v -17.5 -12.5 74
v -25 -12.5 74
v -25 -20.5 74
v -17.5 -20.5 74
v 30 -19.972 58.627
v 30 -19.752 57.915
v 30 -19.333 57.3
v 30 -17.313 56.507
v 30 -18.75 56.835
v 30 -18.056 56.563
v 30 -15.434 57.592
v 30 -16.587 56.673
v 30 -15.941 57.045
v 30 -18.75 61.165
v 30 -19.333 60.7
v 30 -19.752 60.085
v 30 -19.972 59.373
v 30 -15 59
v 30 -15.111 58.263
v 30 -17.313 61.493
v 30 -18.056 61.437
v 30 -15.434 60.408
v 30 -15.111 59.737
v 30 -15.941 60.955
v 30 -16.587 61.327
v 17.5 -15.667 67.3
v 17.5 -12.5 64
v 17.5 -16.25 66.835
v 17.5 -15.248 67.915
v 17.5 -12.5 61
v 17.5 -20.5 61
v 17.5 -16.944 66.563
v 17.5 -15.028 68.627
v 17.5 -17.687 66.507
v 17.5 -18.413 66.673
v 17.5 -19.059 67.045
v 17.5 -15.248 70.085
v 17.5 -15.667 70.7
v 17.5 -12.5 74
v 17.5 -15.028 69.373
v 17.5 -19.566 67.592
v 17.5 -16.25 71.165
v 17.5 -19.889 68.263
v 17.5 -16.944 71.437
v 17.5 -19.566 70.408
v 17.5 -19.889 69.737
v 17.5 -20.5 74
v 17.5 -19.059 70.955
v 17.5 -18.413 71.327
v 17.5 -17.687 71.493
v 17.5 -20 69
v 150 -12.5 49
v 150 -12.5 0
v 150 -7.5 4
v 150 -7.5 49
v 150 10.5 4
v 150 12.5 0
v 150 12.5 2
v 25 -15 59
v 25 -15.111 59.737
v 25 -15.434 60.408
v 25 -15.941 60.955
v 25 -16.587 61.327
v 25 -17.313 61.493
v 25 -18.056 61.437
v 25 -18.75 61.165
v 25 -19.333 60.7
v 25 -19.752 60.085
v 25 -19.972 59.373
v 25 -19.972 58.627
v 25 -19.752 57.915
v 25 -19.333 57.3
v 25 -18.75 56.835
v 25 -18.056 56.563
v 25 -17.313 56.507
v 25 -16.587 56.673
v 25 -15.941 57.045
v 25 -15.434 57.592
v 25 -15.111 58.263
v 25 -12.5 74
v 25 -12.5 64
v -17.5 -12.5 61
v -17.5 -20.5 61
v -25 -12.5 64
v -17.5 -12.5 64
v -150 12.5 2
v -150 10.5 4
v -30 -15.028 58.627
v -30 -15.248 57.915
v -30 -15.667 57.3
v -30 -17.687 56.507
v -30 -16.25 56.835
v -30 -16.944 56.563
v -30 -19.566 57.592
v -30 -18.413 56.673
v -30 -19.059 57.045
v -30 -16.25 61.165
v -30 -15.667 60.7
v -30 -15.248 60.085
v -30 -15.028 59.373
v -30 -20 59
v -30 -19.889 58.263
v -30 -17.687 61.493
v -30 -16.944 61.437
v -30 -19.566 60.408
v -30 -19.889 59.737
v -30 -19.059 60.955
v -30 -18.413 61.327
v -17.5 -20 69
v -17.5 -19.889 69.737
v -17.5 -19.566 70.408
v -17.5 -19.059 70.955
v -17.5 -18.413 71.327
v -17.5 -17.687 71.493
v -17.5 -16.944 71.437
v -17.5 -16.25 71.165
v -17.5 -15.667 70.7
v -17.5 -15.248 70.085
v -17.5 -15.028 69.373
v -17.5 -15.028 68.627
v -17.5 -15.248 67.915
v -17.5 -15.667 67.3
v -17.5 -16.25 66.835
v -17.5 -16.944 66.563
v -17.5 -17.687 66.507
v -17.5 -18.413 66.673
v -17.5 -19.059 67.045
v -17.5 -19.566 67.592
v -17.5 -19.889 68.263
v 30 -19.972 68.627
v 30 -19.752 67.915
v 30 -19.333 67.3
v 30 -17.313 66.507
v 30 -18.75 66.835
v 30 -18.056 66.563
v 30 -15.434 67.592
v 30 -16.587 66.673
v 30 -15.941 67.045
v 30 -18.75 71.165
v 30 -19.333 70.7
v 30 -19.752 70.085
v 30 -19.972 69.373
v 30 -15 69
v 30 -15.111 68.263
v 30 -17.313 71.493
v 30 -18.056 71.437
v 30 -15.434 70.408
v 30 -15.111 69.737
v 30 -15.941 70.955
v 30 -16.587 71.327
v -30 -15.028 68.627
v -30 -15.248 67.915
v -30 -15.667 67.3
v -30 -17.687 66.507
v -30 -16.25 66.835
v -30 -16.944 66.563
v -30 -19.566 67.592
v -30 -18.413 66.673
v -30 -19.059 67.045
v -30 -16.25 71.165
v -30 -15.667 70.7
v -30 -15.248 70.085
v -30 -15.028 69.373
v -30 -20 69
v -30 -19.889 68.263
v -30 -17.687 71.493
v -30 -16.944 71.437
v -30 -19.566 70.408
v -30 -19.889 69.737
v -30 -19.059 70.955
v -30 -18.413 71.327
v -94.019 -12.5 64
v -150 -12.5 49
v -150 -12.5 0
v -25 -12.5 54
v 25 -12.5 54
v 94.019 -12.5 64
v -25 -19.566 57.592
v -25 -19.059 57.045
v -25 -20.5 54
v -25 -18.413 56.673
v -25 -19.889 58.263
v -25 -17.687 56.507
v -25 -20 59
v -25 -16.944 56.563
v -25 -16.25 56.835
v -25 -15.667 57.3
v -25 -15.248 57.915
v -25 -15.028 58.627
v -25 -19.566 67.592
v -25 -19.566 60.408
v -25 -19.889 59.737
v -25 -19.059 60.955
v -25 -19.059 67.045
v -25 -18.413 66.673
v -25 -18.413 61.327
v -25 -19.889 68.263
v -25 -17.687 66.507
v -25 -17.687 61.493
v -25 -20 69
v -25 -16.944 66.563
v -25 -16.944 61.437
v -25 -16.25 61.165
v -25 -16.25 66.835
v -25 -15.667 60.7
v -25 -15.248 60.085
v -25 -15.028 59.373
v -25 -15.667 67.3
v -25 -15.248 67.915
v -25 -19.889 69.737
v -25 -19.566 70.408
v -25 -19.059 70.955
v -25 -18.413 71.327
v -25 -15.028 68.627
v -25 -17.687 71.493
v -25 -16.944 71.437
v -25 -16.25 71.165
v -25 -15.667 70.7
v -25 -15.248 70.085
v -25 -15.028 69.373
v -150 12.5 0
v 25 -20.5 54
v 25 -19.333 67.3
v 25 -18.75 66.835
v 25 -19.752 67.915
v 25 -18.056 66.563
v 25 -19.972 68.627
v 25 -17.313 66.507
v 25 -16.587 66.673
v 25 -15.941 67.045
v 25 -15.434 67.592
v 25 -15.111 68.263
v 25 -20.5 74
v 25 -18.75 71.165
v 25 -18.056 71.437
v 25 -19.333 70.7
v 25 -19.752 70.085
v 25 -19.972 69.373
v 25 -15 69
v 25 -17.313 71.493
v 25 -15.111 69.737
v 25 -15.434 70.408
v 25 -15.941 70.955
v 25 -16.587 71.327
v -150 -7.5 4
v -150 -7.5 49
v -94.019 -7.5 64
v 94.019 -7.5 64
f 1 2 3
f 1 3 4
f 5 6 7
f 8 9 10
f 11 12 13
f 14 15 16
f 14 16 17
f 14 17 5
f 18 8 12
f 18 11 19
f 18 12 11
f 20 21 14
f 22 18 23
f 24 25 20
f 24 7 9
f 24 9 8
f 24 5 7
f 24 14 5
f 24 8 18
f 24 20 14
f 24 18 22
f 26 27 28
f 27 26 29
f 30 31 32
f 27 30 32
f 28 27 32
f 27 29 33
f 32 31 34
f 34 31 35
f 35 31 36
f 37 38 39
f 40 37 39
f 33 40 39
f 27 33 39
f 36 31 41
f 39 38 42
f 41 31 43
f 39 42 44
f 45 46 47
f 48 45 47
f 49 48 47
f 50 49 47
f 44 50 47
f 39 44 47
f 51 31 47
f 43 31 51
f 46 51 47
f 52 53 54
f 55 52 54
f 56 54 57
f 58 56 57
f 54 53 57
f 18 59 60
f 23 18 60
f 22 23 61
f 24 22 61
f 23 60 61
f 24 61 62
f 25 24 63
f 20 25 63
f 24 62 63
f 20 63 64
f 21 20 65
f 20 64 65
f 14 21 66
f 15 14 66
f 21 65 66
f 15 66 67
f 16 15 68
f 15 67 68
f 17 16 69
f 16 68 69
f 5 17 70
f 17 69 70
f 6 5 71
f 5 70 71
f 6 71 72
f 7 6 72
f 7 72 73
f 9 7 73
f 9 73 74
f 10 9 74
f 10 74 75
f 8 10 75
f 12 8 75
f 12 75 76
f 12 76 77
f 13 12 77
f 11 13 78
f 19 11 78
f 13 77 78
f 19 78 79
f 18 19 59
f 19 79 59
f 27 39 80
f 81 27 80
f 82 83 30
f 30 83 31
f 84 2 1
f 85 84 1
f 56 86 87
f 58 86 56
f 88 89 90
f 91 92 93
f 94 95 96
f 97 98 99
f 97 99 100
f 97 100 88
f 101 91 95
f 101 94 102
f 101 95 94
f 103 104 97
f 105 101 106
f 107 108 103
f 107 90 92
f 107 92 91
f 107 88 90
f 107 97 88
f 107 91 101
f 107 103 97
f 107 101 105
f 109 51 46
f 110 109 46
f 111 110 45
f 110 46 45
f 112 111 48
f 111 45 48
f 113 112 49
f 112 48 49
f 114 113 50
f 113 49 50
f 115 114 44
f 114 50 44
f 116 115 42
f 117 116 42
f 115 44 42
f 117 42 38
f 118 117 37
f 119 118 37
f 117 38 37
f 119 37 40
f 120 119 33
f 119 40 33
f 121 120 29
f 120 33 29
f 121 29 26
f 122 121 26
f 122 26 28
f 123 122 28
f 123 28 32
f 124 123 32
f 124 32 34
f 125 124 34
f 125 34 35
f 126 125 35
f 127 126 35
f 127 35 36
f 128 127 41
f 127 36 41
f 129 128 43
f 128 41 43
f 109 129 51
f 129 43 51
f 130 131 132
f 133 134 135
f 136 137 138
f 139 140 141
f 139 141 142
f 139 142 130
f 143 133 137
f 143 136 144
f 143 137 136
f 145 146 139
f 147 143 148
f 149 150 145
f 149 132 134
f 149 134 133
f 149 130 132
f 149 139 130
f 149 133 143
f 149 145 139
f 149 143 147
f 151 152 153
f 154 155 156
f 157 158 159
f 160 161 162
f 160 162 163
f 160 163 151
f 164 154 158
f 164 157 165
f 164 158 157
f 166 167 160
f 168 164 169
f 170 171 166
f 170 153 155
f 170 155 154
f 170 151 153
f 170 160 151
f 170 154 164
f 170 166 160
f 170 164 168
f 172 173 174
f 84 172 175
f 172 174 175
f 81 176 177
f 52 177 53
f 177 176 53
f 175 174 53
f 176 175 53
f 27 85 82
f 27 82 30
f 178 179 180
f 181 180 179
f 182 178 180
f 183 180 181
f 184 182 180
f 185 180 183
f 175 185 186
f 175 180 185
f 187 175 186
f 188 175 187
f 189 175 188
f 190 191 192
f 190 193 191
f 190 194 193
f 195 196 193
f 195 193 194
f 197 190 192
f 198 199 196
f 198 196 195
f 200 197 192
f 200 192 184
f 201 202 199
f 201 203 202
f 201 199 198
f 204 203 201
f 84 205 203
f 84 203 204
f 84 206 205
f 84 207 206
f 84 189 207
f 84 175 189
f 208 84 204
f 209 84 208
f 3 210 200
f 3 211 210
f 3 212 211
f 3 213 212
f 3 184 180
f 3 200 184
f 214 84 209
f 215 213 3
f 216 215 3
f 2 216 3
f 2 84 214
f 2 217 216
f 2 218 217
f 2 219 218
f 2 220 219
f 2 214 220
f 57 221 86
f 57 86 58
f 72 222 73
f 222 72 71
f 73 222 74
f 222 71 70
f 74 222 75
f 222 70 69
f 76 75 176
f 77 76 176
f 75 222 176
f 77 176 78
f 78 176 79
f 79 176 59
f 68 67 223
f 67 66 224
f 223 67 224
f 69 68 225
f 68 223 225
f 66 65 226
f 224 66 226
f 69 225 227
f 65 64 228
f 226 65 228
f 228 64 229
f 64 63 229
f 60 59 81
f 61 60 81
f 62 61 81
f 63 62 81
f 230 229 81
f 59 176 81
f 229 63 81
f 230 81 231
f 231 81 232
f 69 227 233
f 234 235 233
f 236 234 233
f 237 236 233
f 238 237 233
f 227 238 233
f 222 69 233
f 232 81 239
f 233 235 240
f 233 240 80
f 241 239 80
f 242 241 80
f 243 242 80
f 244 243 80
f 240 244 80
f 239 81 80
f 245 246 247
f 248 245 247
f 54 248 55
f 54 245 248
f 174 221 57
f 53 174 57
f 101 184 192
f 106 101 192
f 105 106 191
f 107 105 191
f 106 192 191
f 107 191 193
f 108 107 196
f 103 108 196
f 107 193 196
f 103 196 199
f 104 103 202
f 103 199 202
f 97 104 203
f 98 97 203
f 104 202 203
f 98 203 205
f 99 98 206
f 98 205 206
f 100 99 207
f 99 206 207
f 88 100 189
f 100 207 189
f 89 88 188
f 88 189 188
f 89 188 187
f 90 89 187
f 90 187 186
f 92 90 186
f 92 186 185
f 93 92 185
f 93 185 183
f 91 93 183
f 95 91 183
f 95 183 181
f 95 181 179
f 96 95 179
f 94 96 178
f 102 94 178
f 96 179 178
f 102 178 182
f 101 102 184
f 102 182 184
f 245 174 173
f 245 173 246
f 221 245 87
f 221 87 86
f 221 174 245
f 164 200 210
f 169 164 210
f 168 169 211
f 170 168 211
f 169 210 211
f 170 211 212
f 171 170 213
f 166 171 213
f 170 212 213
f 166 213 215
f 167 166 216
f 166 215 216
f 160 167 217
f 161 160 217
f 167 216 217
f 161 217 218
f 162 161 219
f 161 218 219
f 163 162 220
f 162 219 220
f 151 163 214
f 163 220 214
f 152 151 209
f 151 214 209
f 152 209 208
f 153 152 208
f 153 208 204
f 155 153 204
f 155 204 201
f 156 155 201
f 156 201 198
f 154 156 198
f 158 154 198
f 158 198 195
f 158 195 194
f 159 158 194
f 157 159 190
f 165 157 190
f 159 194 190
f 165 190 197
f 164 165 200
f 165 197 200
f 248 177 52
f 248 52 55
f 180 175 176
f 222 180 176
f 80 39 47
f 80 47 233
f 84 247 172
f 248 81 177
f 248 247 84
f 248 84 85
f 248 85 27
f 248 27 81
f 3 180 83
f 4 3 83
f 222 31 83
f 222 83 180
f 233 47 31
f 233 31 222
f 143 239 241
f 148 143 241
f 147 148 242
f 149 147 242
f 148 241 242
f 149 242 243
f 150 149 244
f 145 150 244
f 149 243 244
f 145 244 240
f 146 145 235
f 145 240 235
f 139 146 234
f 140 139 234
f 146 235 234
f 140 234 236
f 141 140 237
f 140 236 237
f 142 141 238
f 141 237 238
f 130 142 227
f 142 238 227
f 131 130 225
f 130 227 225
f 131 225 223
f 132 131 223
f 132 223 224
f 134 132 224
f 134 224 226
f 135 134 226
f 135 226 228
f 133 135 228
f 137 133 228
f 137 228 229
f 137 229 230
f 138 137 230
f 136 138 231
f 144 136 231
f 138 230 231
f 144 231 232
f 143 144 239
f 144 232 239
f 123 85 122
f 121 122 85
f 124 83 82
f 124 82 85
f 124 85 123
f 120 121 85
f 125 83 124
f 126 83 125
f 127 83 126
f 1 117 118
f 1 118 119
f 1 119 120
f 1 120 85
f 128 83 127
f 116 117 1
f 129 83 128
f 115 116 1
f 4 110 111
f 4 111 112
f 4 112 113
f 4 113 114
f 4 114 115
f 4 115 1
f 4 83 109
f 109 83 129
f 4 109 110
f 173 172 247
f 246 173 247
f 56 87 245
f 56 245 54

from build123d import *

# Parameters (mm, degrees)
F0_W      = 300
F0_H      = 25
F1_DEPTH  = 4
F2_W      = 300
F2_H      = 5
F3_DEPTH  = 60
F4_SIZE2  = 55.980762
F4_SIZE   = 15
F5_SIZE   = 2
F6_W      = 50
F6_H      = 20
F7_DEPTH  = 8
F9_R      = 2.5
F10_DEPTH = 5
F11_R     = 2.5
F12_DEPTH = 5
F13_W     = 35
F13_H     = 25
F14_DEPTH = 8
F15_R     = 2.5
F16_DEPTH = 35


with BuildPart() as f1:
    # F0 (on Top) → F1 (new body)
    with BuildSketch(Plane.XY):
        Rectangle(F0_W, F0_H)
    extrude(amount=F1_DEPTH)

    # F2 (on face) → F3 (join)
    with BuildSketch(Plane.XY.offset(4)):
        with Locations((0, -10)):
            Rectangle(F2_W, F2_H)
    extrude(amount=F3_DEPTH)

    # F4
    f4_edges = [f1.edges().sort_by_distance(p)[0] for p in [
        (-150, -10, 64),
        (150, -10, 64),
    ]]
    chamfer(f4_edges, length=F4_SIZE, length2=F4_SIZE2)

    # F5
    f5_edges = [f1.edges().sort_by_distance(p)[0] for p in [
        (0, 12.5, 4),
    ]]
    chamfer(f5_edges, length=F5_SIZE)

    # F6 (on face) → F7 (join)
    with BuildSketch(Plane.XZ.offset(12.5)):
        with Locations((0, 64)):
            Rectangle(F6_W, F6_H)
    extrude(amount=F7_DEPTH)

    # F9 (on face) → F10 (join)
    with BuildSketch(Plane(origin=(-25, 0, 0), x_dir=(0, -1, 0), z_dir=(-1, 0, 0))):
        with Locations((17.5, 69)):
            Circle(F9_R)
        with Locations((17.5, 59)):
            Circle(F9_R)
    extrude(amount=F10_DEPTH)

    # F11 (on face) → F12 (join)
    with BuildSketch(Plane.YZ.offset(25)):
        with Locations((-17.5, 59)):
            Circle(F11_R)
        with Locations((-17.5, 69)):
            Circle(F11_R)
    extrude(amount=F12_DEPTH)

    # F13 (on face) → F14 (cut)
    with BuildSketch(Plane.XZ.offset(20.5)):
        with Locations((0, 73.5)):
            Rectangle(F13_W, F13_H)
    extrude(amount=-F14_DEPTH, mode=Mode.SUBTRACT)

    # F15 (on face) → F16 (join, through all)
    with BuildSketch(Plane(origin=(17.5, 0, 0), x_dir=(0, -1, 0), z_dir=(-1, 0, 0))):
        with Locations((17.5, 69)):
            Circle(F15_R)
    extrude(amount=F16_DEPTH)


solid = f1.part
